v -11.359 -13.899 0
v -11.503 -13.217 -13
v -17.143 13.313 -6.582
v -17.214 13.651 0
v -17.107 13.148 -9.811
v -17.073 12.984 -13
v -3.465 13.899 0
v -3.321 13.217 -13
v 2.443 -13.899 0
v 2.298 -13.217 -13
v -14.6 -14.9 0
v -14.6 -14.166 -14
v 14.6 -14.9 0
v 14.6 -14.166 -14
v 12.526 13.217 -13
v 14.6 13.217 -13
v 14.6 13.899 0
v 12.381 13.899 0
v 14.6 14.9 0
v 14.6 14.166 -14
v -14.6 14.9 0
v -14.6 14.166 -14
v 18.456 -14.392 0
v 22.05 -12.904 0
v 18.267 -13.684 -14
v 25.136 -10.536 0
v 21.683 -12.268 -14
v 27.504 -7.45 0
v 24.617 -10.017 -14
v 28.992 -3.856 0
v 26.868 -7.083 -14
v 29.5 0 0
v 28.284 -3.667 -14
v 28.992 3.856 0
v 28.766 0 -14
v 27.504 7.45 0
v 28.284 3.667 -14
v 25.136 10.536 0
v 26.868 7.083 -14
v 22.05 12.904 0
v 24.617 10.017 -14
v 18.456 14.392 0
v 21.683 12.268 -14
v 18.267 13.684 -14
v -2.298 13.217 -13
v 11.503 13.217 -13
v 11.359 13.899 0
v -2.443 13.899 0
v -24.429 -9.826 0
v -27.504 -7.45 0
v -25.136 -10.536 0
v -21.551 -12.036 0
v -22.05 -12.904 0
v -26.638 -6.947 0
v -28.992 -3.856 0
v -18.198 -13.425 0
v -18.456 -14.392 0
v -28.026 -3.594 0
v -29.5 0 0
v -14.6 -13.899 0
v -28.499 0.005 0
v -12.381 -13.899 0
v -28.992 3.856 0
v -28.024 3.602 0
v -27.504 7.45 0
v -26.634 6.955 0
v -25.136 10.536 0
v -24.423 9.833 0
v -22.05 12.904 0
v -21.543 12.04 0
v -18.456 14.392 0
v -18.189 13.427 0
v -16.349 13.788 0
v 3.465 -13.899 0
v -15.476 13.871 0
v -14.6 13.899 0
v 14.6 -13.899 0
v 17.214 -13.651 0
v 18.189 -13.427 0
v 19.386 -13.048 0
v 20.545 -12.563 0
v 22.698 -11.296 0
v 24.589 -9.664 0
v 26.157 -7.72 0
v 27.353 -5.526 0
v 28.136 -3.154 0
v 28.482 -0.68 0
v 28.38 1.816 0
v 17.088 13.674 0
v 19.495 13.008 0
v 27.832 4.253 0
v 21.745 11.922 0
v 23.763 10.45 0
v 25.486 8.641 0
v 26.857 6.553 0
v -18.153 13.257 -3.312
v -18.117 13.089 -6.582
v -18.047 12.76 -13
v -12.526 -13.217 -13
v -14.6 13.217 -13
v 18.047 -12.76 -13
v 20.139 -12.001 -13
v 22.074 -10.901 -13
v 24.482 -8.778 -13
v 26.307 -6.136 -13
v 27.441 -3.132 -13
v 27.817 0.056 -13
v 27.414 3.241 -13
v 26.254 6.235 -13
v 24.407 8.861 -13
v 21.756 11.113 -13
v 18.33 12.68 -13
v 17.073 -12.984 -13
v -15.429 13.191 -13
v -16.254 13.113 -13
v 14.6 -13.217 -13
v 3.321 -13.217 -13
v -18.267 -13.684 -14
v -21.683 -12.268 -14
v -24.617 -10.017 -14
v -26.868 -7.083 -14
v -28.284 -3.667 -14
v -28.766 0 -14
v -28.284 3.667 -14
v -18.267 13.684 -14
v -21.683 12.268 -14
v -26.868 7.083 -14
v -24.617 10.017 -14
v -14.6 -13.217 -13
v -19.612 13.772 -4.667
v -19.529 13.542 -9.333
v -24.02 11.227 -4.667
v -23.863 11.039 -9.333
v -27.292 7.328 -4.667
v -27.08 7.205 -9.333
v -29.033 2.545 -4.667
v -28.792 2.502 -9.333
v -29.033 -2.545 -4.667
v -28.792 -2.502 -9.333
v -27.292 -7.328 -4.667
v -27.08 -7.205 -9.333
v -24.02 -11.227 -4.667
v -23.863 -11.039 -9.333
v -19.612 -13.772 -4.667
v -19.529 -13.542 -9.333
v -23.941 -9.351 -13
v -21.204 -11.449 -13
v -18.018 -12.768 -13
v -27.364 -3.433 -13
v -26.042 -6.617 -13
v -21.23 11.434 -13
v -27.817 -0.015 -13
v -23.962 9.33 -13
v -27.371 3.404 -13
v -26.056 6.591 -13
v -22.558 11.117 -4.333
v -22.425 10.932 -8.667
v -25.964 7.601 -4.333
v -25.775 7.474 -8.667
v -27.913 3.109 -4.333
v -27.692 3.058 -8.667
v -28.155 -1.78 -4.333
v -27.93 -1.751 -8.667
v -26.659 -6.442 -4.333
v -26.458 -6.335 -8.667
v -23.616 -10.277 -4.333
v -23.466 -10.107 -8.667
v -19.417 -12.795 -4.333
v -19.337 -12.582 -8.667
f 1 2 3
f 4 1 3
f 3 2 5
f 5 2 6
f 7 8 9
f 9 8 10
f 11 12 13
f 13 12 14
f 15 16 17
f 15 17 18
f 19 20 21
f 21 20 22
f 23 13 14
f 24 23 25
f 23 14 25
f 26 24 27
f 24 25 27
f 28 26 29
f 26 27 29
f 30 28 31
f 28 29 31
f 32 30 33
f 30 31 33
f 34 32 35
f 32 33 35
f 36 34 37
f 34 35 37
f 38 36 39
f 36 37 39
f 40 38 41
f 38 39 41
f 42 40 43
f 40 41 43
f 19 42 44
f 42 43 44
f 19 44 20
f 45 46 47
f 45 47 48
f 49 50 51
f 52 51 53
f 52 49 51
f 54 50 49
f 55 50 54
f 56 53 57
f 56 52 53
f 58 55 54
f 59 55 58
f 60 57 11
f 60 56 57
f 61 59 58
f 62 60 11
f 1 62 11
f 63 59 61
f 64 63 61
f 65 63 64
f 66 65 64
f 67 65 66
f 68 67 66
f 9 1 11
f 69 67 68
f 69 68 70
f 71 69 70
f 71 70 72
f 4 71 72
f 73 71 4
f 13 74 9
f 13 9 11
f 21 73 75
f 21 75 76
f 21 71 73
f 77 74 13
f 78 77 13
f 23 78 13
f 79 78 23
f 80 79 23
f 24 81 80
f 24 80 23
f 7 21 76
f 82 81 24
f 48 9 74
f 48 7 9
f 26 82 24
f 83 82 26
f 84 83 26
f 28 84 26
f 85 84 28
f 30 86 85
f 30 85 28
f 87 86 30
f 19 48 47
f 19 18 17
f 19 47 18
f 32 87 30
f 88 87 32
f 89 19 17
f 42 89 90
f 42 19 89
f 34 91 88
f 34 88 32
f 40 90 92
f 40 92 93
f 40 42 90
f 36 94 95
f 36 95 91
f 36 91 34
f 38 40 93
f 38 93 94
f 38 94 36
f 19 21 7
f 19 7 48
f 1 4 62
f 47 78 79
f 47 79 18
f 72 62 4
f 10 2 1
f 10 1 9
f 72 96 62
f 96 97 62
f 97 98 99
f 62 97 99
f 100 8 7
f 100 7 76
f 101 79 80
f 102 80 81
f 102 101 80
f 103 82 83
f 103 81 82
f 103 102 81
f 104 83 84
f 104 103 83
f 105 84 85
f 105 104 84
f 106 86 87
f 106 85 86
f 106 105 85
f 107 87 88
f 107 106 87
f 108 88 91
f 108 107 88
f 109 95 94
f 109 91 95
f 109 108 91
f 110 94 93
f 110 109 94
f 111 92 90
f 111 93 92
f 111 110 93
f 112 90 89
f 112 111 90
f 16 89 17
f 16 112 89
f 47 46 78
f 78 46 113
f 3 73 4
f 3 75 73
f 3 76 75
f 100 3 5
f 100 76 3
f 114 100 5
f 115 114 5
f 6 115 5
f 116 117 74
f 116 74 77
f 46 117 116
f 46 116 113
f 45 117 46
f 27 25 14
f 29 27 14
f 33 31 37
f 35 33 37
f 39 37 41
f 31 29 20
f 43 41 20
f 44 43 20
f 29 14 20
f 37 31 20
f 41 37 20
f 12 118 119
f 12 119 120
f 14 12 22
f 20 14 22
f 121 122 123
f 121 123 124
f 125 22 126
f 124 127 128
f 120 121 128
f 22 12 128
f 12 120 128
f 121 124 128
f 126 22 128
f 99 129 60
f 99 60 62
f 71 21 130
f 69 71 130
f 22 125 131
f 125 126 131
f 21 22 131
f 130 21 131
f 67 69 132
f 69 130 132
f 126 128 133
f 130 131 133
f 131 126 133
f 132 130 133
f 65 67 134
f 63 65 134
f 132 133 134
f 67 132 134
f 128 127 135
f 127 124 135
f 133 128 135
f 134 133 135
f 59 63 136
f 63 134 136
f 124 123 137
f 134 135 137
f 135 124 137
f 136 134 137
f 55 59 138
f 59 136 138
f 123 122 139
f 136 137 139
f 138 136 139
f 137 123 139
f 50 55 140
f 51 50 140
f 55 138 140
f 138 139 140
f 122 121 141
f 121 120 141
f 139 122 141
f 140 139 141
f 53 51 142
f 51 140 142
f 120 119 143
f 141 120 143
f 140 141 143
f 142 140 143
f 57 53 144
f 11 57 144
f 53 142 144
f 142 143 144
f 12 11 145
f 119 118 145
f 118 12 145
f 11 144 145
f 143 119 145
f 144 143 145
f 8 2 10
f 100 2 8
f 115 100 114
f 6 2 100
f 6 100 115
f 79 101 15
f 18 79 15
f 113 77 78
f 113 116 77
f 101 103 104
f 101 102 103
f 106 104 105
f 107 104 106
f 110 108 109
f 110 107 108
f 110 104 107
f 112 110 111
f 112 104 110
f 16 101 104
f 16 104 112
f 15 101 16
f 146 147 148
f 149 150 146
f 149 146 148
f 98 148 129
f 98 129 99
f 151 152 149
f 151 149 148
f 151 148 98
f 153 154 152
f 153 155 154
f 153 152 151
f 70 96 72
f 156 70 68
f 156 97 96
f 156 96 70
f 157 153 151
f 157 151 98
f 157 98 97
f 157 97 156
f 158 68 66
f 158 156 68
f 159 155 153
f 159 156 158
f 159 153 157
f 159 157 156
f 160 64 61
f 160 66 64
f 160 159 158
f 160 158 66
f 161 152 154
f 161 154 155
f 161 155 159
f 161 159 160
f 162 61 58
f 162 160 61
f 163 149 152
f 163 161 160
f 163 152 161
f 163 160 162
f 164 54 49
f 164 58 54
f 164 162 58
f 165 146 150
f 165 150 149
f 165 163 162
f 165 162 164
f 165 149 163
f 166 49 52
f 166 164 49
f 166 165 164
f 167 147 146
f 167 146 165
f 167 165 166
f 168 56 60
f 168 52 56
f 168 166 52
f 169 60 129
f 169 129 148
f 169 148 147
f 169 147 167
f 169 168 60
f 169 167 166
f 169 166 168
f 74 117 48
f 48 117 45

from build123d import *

# Parameters (mm, degrees)
F1_DEPTH = 14
F1_TAPER = 3
F2_T     = -1
F4_DEPTH = 13


with BuildPart() as f1:
    # F0 (on Top) → F1 (new body)
    with BuildSketch(Plane.XY):
        with BuildLine():
            Line((14.5999998801, 14.9), (-14.6000001199, 14.9))
            ThreePointArc((-14.6000001199, 14.9), (-29.5000001199, 0), (-14.6000001199, -14.9))
            Line((-14.6000001199, -14.9), (14.6000003597, -14.9))
            ThreePointArc((14.6000003597, -14.9), (29.4999998801, 2.398e-07), (14.5999998801, 14.9))
        make_face()
    extrude(amount=-F1_DEPTH, taper=F1_TAPER)

    # F2
    f2_openings = [f1.faces().sort_by_distance(p)[0] for p in [
        (0, 0, 0),
    ]]
    offset(amount=F2_T, openings=f2_openings)

    # F3 (on face) → F4 (join, through all)
    with BuildSketch(Plane.XY.offset(-13)):
        Polygon((-2.4430742086, 13.898627654), (-3.4654148035, 13.898627654), (2.4430742086, -13.898627654), (3.4654148035, -13.898627654), align=None)
        with BuildLine():
            ThreePointArc((-17.2142812839, 13.6505452148), (-17.7037250021, 13.5476471212), (-18.1891496276, 13.4272058328))
            Line((-18.1891496276, 13.4272058328), (-12.3808644169, -13.898627654))
            Line((-12.3808644169, -13.898627654), (-11.358523822, -13.898627654))
            Line((-11.358523822, -13.898627654), (-17.2142812839, 13.6505452148))
        make_face()
        with BuildLine():
            Line((12.3808644169, 13.898627654), (11.358523822, 13.898627654))
            Line((11.358523822, 13.898627654), (17.2142812745, -13.6505451706))
            ThreePointArc((17.2142812745, -13.6505451706), (17.7037249911, -13.5476470688), (18.1891496147, -13.4272057721))
            Line((18.1891496147, -13.4272057721), (12.3808644169, 13.898627654))
        make_face()
    extrude(amount=F4_DEPTH)


solid = f1.part
